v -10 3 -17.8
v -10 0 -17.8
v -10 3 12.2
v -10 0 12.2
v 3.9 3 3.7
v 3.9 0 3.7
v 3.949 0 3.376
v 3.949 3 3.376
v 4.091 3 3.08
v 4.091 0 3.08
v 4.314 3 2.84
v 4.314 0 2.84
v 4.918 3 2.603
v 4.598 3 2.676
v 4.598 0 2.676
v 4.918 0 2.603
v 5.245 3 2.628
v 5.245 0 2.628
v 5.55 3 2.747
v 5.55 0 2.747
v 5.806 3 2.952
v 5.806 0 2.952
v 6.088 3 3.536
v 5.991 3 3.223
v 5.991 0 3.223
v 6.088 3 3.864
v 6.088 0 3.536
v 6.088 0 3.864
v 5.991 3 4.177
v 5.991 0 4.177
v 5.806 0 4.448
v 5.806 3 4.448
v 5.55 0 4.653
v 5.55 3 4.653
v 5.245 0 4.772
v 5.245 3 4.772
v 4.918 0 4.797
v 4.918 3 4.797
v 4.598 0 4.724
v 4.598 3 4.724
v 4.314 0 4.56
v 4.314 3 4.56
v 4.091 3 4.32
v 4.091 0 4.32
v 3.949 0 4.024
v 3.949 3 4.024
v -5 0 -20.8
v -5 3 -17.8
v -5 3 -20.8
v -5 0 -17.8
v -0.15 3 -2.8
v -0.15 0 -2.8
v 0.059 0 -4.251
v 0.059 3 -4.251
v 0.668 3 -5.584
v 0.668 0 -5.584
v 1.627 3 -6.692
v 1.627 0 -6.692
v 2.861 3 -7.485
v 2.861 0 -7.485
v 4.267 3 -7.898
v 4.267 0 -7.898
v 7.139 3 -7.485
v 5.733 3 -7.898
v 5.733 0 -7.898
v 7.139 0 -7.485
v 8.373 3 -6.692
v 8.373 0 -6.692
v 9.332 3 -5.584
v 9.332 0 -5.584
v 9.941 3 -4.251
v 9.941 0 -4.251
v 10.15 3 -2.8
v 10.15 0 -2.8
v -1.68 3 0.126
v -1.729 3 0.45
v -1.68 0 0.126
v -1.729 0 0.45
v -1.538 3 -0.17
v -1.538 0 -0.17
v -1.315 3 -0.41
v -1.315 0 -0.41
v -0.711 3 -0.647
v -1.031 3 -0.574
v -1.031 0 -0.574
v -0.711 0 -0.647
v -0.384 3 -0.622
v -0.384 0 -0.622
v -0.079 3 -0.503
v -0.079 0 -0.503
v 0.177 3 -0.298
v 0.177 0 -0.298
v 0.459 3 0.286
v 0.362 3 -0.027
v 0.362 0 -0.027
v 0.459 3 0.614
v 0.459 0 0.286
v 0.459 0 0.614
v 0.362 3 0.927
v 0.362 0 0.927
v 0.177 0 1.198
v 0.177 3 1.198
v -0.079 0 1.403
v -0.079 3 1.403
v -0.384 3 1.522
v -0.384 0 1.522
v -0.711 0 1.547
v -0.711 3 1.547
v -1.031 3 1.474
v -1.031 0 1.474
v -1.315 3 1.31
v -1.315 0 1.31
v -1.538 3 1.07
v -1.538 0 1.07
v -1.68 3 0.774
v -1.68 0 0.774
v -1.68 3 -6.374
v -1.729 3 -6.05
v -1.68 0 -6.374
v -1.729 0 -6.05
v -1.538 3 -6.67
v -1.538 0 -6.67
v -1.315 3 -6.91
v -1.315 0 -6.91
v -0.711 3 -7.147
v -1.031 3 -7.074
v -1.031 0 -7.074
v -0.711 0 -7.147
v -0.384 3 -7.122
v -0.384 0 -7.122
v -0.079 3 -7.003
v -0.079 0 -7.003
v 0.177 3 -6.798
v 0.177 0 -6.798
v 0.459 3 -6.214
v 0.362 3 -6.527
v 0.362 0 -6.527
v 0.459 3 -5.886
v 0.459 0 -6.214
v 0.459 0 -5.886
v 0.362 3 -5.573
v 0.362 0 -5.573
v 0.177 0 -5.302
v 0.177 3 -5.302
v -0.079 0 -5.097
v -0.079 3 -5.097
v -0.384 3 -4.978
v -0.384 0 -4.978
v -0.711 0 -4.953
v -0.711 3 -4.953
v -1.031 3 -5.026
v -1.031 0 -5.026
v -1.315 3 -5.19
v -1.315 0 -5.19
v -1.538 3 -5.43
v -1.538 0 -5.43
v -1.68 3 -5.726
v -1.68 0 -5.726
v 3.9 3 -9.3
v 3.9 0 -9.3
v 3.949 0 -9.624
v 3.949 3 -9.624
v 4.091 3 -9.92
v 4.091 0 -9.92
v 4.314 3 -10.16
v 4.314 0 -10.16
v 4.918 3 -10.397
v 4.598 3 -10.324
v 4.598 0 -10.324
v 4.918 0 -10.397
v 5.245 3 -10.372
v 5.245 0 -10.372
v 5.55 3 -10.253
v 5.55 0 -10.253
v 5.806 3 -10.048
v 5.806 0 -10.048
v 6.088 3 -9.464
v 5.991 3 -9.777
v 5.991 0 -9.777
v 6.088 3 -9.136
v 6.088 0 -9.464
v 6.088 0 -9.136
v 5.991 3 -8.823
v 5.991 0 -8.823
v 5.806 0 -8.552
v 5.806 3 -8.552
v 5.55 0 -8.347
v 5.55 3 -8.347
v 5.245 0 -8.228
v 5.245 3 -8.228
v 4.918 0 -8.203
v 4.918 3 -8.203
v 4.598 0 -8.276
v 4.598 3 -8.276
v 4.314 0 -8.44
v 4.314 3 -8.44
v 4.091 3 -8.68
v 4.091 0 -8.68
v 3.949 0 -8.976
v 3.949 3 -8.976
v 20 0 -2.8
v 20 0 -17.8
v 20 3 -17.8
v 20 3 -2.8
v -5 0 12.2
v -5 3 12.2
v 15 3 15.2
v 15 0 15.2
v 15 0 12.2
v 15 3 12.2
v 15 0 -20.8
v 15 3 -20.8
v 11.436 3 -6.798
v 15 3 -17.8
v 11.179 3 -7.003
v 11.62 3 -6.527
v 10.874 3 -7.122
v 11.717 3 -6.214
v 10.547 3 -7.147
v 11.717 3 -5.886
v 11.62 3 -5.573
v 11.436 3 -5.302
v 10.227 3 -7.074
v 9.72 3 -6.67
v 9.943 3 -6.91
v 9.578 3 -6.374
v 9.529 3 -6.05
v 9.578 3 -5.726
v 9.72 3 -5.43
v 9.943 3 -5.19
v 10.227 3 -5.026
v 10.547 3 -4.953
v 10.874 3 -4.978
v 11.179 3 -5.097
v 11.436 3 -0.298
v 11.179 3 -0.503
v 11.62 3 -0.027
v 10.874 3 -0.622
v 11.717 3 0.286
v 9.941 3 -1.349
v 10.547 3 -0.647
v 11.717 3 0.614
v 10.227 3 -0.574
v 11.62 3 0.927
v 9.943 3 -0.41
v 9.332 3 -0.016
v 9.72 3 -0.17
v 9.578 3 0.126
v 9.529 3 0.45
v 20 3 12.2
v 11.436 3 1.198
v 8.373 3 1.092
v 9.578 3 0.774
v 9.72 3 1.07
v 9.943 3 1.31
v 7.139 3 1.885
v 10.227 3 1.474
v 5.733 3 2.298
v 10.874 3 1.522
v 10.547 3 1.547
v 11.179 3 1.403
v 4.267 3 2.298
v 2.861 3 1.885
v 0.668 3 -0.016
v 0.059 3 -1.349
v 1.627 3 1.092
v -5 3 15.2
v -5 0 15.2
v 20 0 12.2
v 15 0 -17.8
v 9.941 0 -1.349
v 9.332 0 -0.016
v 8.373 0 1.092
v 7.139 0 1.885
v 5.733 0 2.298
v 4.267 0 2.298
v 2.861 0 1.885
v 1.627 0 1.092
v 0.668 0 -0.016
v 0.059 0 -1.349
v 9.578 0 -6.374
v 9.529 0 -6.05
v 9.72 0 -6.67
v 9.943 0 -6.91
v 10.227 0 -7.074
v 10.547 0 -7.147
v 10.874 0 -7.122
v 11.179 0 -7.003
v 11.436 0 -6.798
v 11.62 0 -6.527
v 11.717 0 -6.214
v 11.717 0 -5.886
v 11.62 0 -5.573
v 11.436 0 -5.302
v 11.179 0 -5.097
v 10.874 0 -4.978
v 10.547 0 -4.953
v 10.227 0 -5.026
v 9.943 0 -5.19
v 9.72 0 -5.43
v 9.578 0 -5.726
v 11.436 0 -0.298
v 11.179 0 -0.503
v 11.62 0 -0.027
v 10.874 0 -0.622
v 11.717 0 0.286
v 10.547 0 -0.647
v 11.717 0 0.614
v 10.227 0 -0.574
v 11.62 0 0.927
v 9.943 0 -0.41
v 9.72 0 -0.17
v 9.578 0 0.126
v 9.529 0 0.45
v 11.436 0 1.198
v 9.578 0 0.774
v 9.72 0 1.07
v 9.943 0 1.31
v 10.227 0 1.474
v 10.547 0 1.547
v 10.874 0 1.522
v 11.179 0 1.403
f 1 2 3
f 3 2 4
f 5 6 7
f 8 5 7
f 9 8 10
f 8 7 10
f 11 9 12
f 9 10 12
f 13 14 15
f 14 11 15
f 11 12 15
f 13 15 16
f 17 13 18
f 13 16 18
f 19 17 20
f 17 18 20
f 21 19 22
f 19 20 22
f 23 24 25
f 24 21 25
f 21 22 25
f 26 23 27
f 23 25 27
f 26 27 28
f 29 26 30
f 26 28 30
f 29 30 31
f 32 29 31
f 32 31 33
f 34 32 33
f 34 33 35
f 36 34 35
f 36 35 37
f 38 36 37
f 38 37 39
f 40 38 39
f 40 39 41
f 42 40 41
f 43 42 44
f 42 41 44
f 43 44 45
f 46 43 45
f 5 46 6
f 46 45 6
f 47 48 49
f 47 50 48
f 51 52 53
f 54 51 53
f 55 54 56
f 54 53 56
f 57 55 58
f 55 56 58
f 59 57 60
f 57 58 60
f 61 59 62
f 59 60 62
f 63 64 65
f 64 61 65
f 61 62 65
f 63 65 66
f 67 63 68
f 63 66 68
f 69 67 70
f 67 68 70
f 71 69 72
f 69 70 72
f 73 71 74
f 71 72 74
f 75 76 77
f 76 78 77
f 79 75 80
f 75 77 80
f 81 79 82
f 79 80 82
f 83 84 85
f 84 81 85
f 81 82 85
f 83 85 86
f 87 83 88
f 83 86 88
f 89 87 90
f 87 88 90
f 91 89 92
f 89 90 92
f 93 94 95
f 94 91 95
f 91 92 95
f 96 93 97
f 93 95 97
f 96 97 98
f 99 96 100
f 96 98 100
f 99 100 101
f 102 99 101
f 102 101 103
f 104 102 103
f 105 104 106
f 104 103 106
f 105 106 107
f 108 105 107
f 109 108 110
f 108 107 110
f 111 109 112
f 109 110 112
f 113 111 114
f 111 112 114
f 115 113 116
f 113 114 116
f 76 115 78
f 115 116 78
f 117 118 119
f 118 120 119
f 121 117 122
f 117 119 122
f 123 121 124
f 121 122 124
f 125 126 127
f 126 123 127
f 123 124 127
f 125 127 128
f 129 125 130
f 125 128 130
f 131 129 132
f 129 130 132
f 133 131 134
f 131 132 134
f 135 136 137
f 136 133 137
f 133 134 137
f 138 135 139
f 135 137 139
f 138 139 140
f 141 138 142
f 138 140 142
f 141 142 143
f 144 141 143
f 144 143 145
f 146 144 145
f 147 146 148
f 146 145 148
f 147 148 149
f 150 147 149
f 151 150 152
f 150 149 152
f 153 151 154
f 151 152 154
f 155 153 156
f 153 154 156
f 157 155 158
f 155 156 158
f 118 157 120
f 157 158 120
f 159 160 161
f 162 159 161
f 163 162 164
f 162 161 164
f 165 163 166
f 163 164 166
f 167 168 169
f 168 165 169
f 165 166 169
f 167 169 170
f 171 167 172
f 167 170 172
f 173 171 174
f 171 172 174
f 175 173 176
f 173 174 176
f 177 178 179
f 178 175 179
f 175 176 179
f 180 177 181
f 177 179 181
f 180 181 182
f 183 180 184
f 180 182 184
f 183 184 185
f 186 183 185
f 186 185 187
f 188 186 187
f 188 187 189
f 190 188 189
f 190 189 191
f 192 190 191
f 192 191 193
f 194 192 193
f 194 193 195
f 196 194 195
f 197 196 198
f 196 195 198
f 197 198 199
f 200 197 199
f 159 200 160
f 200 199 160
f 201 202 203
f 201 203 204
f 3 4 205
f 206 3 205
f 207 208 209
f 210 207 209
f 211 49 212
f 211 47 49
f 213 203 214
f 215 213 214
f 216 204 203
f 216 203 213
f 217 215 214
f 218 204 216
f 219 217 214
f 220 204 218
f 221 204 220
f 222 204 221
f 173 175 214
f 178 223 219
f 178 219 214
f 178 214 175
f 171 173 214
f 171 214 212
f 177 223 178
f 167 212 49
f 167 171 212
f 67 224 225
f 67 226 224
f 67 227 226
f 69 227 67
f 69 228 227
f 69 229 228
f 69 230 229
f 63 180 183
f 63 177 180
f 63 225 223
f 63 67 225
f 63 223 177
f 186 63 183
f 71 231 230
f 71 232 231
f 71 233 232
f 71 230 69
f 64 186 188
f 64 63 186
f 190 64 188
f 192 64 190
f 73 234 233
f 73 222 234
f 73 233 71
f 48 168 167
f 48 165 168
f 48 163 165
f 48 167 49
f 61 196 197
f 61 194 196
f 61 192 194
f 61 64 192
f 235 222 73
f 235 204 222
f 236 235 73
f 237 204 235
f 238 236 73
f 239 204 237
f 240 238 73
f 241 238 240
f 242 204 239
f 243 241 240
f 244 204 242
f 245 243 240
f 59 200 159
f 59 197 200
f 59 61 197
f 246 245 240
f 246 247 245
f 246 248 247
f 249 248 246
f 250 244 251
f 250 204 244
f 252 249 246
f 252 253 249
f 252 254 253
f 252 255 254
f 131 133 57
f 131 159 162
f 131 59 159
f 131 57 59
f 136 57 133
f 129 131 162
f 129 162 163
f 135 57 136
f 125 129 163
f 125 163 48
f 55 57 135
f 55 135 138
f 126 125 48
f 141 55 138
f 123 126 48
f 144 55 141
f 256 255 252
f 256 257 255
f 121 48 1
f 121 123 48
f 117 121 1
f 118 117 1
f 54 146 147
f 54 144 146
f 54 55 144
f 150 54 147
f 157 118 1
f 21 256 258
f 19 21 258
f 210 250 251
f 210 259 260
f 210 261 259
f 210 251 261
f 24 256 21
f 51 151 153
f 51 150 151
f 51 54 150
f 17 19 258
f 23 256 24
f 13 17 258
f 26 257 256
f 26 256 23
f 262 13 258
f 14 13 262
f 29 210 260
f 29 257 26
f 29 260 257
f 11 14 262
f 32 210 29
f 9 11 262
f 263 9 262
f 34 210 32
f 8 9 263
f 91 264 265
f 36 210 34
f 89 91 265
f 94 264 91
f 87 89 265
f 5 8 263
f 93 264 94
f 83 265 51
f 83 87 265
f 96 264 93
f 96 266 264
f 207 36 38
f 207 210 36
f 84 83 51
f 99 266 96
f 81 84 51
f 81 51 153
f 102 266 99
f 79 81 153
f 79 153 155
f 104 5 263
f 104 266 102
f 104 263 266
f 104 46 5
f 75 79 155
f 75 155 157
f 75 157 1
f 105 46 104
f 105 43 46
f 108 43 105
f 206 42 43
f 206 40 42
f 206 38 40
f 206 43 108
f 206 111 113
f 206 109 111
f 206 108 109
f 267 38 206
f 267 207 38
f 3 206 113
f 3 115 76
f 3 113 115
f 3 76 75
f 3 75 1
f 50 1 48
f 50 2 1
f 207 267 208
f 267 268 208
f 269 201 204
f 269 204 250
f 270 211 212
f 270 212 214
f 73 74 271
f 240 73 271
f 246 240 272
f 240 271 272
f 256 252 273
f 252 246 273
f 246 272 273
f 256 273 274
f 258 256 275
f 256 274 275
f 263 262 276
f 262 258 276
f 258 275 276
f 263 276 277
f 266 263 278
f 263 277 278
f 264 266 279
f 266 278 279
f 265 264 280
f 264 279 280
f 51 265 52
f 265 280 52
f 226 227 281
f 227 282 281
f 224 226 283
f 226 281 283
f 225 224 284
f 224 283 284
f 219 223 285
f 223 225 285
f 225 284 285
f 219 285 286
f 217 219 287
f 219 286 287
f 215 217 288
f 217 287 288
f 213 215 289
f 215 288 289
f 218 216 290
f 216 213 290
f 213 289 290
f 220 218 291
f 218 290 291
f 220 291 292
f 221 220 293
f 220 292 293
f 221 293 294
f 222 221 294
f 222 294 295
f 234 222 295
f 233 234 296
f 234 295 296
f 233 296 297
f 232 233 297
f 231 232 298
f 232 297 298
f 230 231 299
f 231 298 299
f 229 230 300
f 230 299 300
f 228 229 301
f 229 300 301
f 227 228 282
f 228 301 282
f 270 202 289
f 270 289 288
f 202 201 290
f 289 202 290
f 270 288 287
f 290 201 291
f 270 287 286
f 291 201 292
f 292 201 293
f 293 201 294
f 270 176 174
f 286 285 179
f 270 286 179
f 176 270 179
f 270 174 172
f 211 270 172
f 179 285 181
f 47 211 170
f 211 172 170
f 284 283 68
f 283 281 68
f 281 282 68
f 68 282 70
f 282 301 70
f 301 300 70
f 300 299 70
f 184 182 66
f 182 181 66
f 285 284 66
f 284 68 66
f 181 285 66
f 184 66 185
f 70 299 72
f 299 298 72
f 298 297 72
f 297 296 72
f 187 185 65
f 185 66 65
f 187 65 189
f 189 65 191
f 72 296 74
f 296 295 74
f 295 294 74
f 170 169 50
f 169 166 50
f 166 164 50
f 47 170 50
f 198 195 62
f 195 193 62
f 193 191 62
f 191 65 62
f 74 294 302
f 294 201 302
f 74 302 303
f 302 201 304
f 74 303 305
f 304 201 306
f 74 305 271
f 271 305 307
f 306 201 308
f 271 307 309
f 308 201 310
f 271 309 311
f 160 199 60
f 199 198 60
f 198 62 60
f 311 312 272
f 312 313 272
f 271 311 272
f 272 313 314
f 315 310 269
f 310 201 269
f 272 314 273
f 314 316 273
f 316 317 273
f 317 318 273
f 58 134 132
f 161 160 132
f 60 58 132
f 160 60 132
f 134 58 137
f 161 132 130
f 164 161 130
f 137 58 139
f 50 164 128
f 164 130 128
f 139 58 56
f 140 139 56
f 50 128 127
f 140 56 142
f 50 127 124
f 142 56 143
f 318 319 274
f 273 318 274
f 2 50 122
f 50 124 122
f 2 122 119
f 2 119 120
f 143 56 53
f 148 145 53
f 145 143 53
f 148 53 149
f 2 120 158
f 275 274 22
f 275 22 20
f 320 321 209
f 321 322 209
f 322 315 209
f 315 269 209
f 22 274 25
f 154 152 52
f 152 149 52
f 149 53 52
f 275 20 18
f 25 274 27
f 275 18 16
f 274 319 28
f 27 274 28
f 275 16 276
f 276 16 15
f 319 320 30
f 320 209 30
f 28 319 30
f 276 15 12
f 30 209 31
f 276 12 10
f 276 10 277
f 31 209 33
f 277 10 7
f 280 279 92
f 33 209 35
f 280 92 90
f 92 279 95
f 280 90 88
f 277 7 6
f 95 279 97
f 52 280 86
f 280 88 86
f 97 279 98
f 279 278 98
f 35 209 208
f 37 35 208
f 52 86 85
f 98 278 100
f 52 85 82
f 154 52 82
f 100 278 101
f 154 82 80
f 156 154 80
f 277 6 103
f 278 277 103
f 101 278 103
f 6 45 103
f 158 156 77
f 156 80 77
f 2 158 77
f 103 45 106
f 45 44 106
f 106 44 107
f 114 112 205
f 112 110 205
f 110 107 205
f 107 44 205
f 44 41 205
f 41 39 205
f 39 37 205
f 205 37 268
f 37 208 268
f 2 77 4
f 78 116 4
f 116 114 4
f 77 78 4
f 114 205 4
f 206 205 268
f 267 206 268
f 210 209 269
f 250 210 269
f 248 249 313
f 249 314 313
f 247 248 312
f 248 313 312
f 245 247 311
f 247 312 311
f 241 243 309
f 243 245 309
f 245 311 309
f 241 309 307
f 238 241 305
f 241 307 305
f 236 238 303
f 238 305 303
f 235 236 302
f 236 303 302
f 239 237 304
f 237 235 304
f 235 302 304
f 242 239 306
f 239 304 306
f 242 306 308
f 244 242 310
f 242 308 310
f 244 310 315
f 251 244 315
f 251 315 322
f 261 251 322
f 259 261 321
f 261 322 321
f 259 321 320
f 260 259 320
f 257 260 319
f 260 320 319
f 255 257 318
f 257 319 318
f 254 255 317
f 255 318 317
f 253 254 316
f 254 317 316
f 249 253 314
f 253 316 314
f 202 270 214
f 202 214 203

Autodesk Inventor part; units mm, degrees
ref_plane "YZ Plane" through (0, 0, 0) normal (1, 0, 0) x (0, 1, 0)
ref_plane "XZ Plane" through (0, 0, 0) normal (0, 1, 0) x (-1, 0, 0)
ref_plane "XY Plane" through (0, 0, 0) normal (0, 0, 1) x (1, 0, 0)
sketch "Sketch1" plane through (0, 0, 0) normal (0, 1, 0) x (-1, 0, 0)
  circle A0 centre (-5, -2.8) radius 5.15
  line L0 (10, -17.8) -> (10, 12.2)
  line L1 (-20, -17.8) -> (-20, 12.2)
  line L2 (10, 12.2) -> (5, 12.2)
  line L3 (5, 12.2) -> (5, 15.2)
  line L4 (-15, 15.2) -> (-15, 12.2)
  circle A1 centre (-5, 3.7) radius 1.1
  circle A2 centre (-10.6292, 0.45) radius 1.1
  circle A3 centre (-10.6292, -6.05) radius 1.1
  circle A4 centre (-5, -9.3) radius 1.1
  circle A5 centre (0.6292, -6.05) radius 1.1
  circle A6 centre (0.6292, 0.45) radius 1.1
  line L5 (-15, 12.2) -> (-20, 12.2)
  line L6 (5, 15.2) -> (-15, 15.2)
  line L7 (10, -17.8) -> (5, -17.8)
  line L8 (5, -17.8) -> (5, -20.8)
  line L9 (5, -20.8) -> (-15, -20.8)
  line L10 (-15, -20.8) -> (-15, -17.8)
  line L11 (-15, -17.8) -> (-20, -17.8)
  line L12 (-20, -17.8) -> (-20, -2.8)
  line L13 (-20, -2.8) -> (-5, -2.8)
  dimension "d7" = 360
  dimension "d42" = 30
  dimension "d43" = 5
  dimension "d44" = 3
  dimension "d49" = 2.2
  dimension "d52" = 360
  dimension "d57" = 30
  dimension "d59" = 5
  dimension "d60" = 3
  dimension "d61" = 20
  dimension "d62" = 15
extrude "Extrusion1" add sketch "Sketch1" along normal blind 3
properties part number "Motor Mount" material "PVC, Unplasticized"
